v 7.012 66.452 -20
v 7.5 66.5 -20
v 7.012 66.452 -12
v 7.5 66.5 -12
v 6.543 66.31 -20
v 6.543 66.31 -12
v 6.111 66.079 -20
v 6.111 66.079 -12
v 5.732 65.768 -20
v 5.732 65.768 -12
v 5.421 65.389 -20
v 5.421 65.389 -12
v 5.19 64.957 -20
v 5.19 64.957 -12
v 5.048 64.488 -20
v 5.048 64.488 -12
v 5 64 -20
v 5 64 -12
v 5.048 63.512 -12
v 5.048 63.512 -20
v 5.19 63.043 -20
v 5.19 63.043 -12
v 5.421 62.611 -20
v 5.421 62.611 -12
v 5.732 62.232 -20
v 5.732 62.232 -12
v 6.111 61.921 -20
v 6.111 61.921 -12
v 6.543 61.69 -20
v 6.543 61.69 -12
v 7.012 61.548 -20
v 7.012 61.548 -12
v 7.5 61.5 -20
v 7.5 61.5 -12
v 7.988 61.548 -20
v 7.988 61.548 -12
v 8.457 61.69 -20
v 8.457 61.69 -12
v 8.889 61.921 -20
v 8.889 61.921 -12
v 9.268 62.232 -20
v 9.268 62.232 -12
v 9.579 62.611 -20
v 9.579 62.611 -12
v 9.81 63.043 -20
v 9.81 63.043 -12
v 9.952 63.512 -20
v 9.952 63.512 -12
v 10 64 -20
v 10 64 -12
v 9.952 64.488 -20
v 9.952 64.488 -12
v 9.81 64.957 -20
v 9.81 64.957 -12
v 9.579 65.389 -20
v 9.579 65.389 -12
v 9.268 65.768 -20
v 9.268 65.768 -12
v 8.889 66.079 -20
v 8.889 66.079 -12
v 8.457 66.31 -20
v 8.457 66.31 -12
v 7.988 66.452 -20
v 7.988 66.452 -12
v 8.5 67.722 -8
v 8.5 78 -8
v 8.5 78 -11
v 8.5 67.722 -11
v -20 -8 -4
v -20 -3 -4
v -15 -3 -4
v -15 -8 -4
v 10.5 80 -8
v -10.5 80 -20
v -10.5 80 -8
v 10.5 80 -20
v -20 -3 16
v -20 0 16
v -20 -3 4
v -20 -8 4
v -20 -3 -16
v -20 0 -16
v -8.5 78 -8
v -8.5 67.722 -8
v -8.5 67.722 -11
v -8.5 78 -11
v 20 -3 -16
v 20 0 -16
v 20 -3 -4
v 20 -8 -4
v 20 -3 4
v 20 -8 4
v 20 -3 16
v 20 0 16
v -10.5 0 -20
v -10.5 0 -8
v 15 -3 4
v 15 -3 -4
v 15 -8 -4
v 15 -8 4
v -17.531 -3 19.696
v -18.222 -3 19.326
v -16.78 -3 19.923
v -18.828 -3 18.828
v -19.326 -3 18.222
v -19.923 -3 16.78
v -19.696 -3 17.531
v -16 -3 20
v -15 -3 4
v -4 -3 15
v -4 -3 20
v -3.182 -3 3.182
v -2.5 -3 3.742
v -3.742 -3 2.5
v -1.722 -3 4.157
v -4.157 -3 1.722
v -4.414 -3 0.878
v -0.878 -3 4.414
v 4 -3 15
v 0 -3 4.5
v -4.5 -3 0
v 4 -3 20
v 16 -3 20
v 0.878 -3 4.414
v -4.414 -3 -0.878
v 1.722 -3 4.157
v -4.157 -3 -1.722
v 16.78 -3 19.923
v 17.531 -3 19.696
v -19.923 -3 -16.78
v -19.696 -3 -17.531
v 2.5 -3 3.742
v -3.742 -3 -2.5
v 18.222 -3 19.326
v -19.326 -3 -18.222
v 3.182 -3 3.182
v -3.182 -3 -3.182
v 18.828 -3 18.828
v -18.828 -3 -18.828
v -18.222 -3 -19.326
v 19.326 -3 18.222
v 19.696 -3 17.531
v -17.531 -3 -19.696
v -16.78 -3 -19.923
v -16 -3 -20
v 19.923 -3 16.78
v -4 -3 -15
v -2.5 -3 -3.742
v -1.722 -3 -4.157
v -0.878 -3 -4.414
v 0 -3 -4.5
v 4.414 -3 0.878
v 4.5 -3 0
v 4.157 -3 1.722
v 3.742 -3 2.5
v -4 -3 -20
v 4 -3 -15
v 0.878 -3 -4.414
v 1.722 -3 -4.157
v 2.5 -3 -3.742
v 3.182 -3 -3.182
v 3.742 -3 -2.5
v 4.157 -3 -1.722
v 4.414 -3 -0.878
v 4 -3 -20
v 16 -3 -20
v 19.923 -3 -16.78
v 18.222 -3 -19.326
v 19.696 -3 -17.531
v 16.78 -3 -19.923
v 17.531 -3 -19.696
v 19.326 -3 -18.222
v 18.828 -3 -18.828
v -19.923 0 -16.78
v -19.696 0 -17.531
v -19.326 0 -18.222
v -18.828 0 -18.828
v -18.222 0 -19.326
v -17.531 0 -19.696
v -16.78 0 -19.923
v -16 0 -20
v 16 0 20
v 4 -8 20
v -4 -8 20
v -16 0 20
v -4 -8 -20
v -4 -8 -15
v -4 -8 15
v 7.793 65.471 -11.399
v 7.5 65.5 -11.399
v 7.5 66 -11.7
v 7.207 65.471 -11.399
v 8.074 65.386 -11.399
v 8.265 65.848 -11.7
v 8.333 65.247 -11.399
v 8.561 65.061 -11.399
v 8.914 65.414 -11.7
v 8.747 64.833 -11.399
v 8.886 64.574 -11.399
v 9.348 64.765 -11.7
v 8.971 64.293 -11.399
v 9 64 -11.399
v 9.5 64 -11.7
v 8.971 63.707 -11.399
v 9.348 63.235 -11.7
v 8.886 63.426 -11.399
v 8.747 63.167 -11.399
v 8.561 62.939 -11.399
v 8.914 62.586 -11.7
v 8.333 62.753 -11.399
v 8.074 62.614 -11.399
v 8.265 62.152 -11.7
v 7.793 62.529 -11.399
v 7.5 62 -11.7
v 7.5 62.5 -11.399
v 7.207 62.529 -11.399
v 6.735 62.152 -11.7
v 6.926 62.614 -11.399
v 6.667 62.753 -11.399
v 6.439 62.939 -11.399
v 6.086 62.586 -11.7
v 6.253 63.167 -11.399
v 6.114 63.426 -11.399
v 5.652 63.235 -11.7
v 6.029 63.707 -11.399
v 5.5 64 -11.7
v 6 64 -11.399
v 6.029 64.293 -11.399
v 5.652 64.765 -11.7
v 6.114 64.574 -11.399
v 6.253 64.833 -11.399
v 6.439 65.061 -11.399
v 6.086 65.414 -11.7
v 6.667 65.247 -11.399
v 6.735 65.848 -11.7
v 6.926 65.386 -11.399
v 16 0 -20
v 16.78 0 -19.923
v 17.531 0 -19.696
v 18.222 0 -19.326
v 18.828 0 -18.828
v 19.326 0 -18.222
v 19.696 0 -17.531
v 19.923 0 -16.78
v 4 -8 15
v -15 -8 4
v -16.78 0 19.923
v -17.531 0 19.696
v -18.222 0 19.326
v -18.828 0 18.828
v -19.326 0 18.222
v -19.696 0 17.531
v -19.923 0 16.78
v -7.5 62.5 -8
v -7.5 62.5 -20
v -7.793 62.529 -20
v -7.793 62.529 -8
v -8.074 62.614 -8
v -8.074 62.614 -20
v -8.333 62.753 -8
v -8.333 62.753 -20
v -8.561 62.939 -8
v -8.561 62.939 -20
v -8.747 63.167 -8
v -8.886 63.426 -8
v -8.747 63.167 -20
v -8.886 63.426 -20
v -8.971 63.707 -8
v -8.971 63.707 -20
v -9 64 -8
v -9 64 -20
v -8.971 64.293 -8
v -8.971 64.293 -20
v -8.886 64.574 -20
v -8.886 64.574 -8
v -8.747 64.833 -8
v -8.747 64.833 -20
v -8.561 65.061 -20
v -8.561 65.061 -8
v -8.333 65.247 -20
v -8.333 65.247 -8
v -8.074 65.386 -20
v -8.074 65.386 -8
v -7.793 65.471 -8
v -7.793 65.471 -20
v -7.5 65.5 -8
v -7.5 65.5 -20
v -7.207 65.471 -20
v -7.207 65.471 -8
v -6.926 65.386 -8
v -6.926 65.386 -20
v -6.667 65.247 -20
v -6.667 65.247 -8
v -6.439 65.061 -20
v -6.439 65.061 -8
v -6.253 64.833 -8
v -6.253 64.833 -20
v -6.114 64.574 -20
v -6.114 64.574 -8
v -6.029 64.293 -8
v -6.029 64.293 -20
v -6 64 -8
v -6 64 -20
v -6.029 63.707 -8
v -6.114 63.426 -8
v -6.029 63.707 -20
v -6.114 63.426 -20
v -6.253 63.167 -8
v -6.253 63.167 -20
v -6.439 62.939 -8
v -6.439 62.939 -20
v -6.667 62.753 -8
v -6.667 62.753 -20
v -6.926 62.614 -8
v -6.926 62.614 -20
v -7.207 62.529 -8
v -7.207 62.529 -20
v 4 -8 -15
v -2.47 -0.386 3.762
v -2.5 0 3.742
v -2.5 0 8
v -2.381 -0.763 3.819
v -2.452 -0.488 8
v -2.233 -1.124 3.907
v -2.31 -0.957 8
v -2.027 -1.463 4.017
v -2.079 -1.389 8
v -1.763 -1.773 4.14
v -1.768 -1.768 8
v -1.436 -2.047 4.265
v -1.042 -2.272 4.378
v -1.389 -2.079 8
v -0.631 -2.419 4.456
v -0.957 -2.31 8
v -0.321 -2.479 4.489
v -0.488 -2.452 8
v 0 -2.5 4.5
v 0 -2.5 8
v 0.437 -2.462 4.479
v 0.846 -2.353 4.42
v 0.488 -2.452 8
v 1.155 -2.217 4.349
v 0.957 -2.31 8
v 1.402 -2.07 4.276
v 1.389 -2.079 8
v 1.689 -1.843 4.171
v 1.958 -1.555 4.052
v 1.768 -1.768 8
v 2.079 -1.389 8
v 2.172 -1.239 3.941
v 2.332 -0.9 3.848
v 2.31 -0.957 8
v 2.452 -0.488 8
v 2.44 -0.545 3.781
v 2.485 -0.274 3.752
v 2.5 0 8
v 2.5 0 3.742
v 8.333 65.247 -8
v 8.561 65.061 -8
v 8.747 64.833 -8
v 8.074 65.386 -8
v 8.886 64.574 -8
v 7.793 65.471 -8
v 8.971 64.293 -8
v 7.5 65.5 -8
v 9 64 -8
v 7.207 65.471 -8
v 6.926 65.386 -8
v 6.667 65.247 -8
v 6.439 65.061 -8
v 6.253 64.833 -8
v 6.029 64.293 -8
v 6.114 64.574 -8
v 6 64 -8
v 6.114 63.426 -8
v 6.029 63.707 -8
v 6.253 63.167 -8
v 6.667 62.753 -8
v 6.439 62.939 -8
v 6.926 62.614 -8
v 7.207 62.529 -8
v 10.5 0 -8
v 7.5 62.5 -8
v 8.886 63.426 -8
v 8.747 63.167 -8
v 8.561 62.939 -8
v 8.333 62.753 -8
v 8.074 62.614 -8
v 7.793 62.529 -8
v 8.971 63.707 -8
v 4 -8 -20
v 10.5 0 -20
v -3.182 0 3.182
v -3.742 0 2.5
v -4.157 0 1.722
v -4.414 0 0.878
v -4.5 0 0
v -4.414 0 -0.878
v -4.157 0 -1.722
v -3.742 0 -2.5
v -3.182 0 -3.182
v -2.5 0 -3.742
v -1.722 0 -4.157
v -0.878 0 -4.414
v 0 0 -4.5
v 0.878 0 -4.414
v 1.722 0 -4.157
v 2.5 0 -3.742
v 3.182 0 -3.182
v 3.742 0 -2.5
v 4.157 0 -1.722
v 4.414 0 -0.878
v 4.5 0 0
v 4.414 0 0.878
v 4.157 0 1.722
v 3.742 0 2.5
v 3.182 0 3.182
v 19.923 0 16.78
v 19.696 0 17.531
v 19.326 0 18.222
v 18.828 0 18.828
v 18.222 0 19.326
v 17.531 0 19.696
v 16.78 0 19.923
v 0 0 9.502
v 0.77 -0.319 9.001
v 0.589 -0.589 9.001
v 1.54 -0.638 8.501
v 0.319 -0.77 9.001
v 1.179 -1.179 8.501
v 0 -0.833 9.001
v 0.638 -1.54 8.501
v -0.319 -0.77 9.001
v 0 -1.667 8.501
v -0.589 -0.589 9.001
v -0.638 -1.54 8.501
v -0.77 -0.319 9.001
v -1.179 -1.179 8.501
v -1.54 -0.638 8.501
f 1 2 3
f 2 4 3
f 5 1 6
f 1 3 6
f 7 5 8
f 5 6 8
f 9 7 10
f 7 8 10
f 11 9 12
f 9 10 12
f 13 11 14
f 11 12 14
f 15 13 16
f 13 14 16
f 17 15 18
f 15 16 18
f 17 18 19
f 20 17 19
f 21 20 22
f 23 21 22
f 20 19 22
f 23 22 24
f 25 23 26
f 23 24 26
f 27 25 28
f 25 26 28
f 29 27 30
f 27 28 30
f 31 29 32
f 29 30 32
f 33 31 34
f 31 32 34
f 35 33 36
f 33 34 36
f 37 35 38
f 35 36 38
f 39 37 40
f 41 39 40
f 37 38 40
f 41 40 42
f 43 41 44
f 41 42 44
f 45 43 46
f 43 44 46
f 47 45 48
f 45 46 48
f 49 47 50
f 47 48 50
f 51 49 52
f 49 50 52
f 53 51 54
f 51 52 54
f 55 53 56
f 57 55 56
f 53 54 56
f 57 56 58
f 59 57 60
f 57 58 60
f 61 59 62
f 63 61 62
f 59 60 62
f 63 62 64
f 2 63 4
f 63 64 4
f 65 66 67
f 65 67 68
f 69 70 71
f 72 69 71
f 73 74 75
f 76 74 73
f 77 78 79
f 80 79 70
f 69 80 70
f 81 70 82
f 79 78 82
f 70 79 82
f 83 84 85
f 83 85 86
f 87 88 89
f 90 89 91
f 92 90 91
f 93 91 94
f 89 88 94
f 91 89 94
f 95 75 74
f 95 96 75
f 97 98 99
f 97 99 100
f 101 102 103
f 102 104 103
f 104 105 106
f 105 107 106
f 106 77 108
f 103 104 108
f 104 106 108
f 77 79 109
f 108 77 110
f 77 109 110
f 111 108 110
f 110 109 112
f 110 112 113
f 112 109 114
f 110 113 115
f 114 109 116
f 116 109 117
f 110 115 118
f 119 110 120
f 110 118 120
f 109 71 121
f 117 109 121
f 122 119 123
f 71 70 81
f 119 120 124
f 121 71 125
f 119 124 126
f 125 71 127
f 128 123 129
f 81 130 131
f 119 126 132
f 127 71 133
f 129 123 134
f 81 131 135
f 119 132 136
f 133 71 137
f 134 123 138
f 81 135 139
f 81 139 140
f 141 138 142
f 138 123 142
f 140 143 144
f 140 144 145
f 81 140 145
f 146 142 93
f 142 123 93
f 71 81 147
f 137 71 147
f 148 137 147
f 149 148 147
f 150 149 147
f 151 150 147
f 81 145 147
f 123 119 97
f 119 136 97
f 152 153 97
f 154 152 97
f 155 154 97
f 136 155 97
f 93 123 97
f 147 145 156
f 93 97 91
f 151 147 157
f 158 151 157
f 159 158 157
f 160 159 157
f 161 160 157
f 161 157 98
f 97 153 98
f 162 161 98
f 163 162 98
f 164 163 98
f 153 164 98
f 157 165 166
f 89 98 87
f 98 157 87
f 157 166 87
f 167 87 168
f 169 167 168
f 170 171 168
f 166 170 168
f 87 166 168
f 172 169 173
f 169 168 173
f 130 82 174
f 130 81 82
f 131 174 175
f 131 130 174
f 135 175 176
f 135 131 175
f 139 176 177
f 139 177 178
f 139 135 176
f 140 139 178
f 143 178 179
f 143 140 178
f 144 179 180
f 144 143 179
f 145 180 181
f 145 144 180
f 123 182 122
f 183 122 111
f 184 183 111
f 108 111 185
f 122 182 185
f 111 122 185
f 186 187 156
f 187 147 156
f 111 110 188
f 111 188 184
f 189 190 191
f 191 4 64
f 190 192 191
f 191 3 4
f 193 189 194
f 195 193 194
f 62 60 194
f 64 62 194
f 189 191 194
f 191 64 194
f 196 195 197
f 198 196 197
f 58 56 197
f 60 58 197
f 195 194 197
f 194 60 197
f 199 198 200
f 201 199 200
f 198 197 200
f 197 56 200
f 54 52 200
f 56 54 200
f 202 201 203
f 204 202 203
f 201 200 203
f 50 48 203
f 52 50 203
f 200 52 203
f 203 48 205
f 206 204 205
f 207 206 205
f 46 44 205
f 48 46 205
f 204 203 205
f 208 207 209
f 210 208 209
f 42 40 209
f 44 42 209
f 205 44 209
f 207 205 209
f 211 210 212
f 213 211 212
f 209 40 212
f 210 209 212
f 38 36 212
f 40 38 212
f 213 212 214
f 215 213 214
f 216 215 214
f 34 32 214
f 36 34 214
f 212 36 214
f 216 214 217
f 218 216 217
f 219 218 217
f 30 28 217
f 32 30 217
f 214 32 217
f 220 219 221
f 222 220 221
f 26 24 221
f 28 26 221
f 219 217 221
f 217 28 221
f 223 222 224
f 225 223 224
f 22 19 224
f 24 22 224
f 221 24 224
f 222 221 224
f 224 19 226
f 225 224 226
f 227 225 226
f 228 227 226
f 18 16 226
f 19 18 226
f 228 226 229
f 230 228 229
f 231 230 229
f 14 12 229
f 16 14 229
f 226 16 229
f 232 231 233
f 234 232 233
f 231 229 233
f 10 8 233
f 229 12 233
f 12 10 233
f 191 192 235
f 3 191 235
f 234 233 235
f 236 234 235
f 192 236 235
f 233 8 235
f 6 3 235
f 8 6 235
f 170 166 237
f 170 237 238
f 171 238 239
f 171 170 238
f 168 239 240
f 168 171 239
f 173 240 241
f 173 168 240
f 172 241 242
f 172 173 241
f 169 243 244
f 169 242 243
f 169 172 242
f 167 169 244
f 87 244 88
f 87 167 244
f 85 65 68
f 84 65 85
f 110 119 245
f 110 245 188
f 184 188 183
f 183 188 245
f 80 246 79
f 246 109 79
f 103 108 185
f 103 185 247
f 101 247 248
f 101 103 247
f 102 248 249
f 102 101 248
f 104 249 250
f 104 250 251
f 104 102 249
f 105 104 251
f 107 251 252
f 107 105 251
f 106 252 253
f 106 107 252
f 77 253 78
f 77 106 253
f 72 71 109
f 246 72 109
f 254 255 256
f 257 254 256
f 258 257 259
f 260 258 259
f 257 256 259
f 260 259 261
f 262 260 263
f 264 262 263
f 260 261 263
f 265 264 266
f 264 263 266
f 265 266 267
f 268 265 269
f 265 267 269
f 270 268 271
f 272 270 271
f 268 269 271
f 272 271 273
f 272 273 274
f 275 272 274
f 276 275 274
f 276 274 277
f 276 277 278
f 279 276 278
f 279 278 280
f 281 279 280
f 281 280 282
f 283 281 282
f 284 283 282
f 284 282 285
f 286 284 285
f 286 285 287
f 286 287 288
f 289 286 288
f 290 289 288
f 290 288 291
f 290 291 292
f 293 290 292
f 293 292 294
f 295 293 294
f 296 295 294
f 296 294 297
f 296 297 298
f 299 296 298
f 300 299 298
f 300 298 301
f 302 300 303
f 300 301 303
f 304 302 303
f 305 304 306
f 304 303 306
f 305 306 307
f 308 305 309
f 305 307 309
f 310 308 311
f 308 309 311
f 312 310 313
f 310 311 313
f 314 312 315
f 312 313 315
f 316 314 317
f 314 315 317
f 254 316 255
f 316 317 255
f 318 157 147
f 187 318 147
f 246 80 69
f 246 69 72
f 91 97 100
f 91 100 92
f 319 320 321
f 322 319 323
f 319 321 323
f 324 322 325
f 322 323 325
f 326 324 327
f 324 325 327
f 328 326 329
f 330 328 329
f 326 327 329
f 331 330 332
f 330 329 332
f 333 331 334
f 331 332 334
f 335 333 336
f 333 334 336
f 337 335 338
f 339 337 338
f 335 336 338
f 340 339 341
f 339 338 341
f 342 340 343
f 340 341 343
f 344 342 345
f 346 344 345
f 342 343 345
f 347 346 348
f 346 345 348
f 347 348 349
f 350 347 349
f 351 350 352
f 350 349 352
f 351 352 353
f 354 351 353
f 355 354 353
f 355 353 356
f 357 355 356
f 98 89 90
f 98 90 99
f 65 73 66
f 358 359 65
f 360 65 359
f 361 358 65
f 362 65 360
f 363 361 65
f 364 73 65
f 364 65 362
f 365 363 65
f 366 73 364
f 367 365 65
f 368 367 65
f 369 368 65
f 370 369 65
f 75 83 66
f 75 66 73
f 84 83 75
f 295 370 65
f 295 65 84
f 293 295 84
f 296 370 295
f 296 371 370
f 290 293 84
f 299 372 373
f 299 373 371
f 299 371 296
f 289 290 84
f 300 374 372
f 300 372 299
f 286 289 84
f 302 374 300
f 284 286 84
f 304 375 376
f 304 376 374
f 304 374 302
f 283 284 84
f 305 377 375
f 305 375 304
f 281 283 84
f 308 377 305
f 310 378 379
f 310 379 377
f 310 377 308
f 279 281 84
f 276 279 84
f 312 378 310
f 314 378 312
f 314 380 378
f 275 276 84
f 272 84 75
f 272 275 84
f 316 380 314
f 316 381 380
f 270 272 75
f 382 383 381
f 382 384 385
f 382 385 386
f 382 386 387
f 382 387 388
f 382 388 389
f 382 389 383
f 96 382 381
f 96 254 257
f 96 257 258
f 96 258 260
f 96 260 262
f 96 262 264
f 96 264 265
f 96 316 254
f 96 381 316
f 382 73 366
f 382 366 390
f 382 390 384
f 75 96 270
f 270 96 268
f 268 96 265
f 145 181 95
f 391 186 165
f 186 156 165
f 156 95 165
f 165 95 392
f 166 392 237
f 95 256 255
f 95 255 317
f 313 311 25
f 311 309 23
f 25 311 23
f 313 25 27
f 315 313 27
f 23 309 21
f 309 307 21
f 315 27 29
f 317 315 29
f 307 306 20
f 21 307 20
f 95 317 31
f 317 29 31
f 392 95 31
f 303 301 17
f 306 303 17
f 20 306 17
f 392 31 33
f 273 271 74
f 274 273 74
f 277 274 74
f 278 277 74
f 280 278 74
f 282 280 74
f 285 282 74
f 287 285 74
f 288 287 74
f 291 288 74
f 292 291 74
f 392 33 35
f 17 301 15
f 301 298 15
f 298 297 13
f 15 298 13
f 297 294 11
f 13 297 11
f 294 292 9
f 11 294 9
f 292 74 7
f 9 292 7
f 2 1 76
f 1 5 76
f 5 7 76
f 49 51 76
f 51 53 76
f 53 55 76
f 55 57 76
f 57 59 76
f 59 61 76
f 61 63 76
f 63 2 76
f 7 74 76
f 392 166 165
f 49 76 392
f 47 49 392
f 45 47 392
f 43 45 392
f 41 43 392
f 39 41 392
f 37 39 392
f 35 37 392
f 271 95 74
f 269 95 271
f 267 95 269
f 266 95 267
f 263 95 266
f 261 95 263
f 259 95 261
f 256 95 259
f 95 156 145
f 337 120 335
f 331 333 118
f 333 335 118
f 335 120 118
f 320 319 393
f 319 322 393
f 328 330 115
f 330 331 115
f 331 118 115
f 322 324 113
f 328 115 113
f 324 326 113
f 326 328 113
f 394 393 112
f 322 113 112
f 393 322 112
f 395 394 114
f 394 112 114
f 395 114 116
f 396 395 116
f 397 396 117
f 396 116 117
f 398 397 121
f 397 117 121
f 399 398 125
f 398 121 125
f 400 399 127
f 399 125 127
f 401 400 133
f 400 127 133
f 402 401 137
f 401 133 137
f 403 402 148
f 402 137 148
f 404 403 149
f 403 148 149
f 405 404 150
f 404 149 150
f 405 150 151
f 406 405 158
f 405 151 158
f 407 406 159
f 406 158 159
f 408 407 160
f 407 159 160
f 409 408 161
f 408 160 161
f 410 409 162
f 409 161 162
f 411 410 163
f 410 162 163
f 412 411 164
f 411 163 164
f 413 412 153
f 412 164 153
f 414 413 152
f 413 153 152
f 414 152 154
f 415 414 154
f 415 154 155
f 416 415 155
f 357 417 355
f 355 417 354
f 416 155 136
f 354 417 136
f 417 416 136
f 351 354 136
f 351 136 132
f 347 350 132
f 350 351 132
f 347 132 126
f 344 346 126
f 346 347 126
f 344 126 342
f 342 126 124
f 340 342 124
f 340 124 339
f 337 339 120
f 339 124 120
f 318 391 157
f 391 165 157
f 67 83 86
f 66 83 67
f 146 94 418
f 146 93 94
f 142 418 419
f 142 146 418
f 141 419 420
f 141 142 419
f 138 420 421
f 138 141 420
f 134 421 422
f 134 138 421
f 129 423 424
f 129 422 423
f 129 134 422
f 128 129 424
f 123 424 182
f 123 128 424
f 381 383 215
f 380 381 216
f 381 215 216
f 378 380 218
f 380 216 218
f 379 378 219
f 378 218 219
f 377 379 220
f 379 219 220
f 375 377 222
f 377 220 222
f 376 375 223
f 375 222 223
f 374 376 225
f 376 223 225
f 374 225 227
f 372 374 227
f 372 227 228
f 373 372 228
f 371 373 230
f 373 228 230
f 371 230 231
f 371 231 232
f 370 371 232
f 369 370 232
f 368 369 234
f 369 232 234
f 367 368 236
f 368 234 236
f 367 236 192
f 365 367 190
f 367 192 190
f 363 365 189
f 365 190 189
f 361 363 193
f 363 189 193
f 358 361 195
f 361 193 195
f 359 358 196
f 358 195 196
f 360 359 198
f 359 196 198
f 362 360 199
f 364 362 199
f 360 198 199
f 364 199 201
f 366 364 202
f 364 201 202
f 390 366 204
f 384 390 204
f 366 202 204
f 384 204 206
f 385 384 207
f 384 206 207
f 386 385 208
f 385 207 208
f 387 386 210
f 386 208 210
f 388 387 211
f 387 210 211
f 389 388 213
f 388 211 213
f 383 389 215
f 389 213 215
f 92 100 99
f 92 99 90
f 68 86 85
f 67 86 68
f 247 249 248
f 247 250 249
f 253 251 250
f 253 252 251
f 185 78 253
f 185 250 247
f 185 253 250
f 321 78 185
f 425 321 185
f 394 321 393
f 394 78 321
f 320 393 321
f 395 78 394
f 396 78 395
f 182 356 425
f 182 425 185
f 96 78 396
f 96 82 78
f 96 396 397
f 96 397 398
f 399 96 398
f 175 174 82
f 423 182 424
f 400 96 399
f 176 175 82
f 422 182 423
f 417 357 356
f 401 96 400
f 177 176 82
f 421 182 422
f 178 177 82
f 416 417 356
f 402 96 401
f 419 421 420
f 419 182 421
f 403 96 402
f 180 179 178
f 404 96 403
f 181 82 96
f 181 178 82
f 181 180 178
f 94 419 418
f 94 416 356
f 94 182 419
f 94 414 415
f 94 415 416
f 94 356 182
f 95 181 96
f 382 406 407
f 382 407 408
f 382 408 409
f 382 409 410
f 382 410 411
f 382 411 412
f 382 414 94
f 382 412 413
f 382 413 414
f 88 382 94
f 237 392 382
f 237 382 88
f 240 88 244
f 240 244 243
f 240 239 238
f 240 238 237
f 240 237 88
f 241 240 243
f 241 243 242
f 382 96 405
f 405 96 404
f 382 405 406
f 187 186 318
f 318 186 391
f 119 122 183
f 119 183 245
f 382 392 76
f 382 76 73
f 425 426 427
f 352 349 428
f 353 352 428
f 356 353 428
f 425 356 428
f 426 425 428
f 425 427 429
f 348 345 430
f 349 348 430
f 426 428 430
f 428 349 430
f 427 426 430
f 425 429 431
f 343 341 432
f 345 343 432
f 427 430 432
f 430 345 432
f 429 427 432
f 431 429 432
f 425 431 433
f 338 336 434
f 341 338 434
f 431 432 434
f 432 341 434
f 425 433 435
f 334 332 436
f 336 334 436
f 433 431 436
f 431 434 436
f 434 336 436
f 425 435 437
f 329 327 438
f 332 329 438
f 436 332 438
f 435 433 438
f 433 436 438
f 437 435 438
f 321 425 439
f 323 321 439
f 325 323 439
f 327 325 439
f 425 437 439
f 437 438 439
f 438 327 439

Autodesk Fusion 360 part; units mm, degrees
sketch "Sketch1" plane through (0, 0, 0) normal (0, 1, 0) x (1, 0, 0)
  line L0 (20, -20) -> (-20, -20)
  line L1 (-20, -20) -> (-20, 20)
  line L2 (-20, 20) -> (20, 20)
  line L3 (20, 20) -> (20, -20)
  line L4 (20, -20) -> (-20, 20) construction
  line L5 (-20, -20) -> (20, 20) construction
  line L6 (-20, 4) -> (-15, 4)
  line L7 (-15, 4) -> (-15, -4)
  line L8 (-15, -4) -> (-20, -4)
  line L9 (-20, -4) -> (-20, 4)
  line L10 (-4, 20) -> (4, 20)
  line L11 (4, 20) -> (4, 15)
  line L12 (4, 15) -> (-4, 15)
  line L13 (-4, 15) -> (-4, 20)
  line L14 (20, 4) -> (15, 4)
  line L15 (15, 4) -> (15, -4)
  line L16 (15, -4) -> (20, -4)
  line L17 (20, -4) -> (20, 4)
  line L18 (-4, -20) -> (4, -20)
  line L19 (4, -20) -> (4, -15)
  line L20 (4, -15) -> (-4, -15)
  line L21 (-4, -15) -> (-4, -20)
  dimension "d1" = 40
  dimension "d2" = 40
  dimension "d3" = 5
  dimension "d4" = 8
  dimension "d5" = 16
  dimension "d6" = 5
  dimension "d7" = 16
  dimension "d8" = 8
  dimension "d9" = 5
  dimension "d10" = 5
  dimension "d11" = 8
  dimension "d12" = 8
  dimension "d13" = 16
  dimension "d14" = 16
extrude "Extrude1" add sketch "Sketch1" against normal blind 3 contours L0 L1 L2 L3 L6 L7 L8 L11 L12 L13 L14 L15 L16 L19 L20 L21
extrude "Extrude2" add sketch "Sketch1" against normal blind 8 contours L0 L18 L19 L20 L21 | L3 L14 L15 L16 L17 | L1 L6 L7 L8 L9 | L2 L10 L11 L12 L13
hole "Hole1" at (0, 0, 0) direction (0, -1, 0) diameter 9 depth 30 tip angle 118
fillet "Fillet1" radius 4 4 edges at (20, -1.5, -20) (-20, -1.5, -20) (20, -1.5, 20) (-20, -1.5, 20)
sketch "Sketch2" plane through (0, 0, 0) normal (0, 0, 1) x (1, 0, 0)
sketch "Sketch3" plane through (0, 0, 0) normal (0, 1, 0) x (1, 0, 0)
  line L0 (-10.5, 20) -> (10.5, 20)
  line L1 (10.5, 20) -> (10.5, 8)
  line L2 (10.5, 8) -> (-10.5, 8)
  line L3 (-10.5, 8) -> (-10.5, 20)
  line L4 (-20, -20) -> (-20, 20)
  dimension "d26" = 21
  dimension "d27" = 9.5
  dimension "d28" = 12
extrude "Extrude3" add sketch "Sketch3" along normal blind 80
sketch "Sketch4" plane through (0, 0, -8) normal (0, 0, 1) x (1, 0, 0)
  line L0 (-10.5, 0) -> (10.5, 0)
  line L1 (10.5, 0) -> (10.5, 80)
  line L2 (10.5, 80) -> (-10.5, 80)
  line L3 (-10.5, 80) -> (-10.5, 0)
  line L4 (-10.5, 80) -> (10.5, 80)
  line L5 (10.5, 80) -> (10.5, 59)
  line L6 (10.5, 59) -> (-10.5, 59)
  line L7 (-10.5, 59) -> (-10.5, 80)
  line L8 (8.5, 78) -> (8.5, 61)
  line L9 (8.5, 61) -> (-8.5, 61)
  line L10 (-8.5, 61) -> (-8.5, 78)
  line L11 (-8.5, 78) -> (8.5, 78)
  line L12 (-8.5, 78) -> (8.5, 78)
  line L13 (8.5, 78) -> (8.5, 67.7217)
  line L14 (8.5, 67.7217) -> (-8.5, 67.7217)
  line L15 (-8.5, 67.7217) -> (-8.5, 78)
  point P0 (-7.5, 64)
  point P1 (7.5, 64)
  dimension "d29" = 21
  dimension "d30" = 21
  dimension "d31" = 2
  dimension "d34" = 5
  dimension "d35" = 15
  dimension "d36" = 3
hole "Hole2" at (-7.5, 64, -8) at (7.5, 64, -8) direction (0, 0, -1) diameter 3 depth 55 tip angle 118
extrude "Extrude4" cut sketch "Sketch4" against normal blind 3 contours L8 L10 L11 L12 L13 L14 L15
sketch "Sketch5" plane through (0, 0, -20) normal (0, 0, -1) x (-1, 0, 0)
  circle A0 centre (7.5, 64) radius 1.5
  circle A1 centre (-7.5, 64) radius 1.5
  line L0 (16, -3) -> (16, 0)
  line L1 (16, 0) -> (10.5, 0)
  line L2 (10.5, 0) -> (10.5, 80)
  line L3 (10.5, 80) -> (-10.5, 80)
  line L4 (-10.5, 80) -> (-10.5, 0)
  line L5 (-10.5, 0) -> (-16, 0)
  line L6 (-16, 0) -> (-16, -3)
  line L7 (-16, -3) -> (-4, -3)
  line L8 (-4, -3) -> (-4, -8)
  line L9 (-4, -8) -> (4, -8)
  line L10 (4, -8) -> (4, -3)
  line L11 (4, -3) -> (16, -3)
  point P0 (-7.5, 64)
  point P1 (7.5, 64)
  point P2 (17, 58)
hole "Hole3" at (7.5, 64, -20) at (0, 0, 0) direction (0, 0, 1) diameter 5 depth 8 tip angle 118
equation "d6 = d3"
equation "d7 = d5"
equation "d8 = d4"
equation "d9 = d3"
equation "d10 = d3"
equation "d11 = d4"
equation "d12 = d4"
equation "d13 = d7"
equation "d14 = d7"
